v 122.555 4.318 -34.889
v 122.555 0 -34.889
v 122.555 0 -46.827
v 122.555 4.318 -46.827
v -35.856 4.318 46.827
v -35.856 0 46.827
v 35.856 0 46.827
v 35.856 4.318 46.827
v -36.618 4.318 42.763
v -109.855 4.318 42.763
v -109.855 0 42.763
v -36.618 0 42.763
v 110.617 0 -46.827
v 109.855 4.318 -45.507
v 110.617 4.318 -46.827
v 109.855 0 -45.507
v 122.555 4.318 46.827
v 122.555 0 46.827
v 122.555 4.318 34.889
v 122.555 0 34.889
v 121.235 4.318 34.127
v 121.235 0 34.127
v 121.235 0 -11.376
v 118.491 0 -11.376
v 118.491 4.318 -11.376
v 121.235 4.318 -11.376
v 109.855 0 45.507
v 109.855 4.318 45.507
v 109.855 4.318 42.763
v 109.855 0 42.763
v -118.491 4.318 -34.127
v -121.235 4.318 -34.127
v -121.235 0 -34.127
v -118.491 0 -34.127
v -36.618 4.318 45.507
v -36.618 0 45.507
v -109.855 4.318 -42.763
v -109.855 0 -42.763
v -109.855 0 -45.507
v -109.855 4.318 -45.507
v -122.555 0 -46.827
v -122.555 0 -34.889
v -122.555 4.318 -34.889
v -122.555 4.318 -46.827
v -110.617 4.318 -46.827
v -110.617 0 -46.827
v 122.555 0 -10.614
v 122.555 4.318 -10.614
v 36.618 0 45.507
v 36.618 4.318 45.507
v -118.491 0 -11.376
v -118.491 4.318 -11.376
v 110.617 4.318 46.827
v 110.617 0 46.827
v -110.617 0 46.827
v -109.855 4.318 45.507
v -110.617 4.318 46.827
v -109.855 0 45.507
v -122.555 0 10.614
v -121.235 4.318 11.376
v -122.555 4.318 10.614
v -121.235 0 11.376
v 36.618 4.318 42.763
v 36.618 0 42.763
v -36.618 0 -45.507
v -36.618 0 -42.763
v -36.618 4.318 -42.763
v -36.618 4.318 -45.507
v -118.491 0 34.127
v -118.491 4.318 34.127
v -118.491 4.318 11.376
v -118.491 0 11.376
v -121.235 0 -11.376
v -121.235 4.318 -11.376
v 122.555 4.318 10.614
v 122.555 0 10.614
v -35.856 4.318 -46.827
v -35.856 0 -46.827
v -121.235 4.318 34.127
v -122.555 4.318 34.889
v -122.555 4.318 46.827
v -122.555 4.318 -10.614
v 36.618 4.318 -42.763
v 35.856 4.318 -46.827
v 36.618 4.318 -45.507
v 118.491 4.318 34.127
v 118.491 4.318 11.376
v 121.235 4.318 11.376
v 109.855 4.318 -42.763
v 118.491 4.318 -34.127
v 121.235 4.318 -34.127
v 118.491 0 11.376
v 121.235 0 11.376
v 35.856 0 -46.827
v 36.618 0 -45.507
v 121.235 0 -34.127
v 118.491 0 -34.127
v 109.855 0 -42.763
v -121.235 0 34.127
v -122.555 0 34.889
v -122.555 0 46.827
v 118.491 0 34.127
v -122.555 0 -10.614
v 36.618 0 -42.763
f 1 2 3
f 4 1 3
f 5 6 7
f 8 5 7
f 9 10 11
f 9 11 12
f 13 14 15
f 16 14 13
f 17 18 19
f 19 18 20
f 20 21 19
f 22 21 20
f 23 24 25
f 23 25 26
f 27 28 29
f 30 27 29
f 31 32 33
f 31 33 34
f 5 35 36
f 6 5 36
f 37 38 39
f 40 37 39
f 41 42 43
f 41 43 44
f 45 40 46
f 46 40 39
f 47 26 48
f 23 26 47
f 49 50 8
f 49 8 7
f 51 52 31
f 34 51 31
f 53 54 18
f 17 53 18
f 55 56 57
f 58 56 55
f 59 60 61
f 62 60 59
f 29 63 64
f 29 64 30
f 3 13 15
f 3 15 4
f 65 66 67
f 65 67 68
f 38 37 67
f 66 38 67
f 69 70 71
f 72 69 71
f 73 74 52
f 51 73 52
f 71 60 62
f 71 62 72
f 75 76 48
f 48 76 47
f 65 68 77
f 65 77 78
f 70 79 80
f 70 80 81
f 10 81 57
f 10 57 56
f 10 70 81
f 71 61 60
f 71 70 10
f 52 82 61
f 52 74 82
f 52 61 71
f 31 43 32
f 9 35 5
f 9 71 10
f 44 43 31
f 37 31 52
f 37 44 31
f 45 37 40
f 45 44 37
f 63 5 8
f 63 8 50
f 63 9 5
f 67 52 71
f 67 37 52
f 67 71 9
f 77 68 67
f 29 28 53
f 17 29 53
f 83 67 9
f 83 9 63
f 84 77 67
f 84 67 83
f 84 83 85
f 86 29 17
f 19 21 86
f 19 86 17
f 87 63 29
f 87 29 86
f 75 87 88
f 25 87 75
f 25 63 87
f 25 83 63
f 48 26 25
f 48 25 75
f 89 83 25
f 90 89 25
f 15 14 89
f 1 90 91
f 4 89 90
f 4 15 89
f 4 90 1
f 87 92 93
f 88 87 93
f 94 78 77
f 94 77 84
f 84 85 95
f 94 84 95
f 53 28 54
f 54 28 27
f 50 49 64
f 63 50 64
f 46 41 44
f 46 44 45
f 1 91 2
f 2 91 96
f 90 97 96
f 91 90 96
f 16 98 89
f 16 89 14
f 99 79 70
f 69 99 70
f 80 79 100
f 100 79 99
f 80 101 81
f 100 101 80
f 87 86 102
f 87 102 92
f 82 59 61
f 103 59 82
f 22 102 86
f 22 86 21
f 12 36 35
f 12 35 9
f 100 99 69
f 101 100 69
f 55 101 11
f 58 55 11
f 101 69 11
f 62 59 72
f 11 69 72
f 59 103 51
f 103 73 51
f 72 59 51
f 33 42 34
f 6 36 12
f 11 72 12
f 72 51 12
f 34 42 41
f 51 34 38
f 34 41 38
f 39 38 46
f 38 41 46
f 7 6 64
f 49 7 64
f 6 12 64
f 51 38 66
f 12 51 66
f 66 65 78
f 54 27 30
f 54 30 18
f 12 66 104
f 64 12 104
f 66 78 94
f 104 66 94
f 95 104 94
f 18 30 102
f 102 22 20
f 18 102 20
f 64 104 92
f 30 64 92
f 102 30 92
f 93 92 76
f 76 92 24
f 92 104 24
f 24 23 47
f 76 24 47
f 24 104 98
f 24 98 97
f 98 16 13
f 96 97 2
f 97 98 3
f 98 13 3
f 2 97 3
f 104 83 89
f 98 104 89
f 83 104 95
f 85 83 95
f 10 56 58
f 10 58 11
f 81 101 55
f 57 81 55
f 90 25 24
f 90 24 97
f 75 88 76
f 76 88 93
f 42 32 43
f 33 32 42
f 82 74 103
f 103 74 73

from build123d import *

# Parameters (mm, degrees)
SKETCH1_W             = 245.11
SKETCH1_H             = 93.653112922
BOSS_EXTRUDE1_DEPTH   = 4.318
CUT_EXTRUDE1_REACH    = 6.318
SKETCH2_W             = 4.064
SKETCH2_H             = 22.751037641
SKETCH2_W_2           = 73.236666667
SKETCH2_H_2           = 4.064
CHAMFER1_SIZE         = 0.762
CHAMFER1_SIZE2        = 1.319822715
CHAMFER1_PART_2_SIZE  = 0.762
CHAMFER1_PART_2_SIZE2 = 1.319822715
CHAMFER1_PART_3_SIZE  = 0.762
CHAMFER1_PART_3_SIZE2 = 1.319822715
CHAMFER1_PART_4_SIZE  = 0.762
CHAMFER1_PART_4_SIZE2 = 1.319822715
CHAMFER1_PART_5_SIZE  = 0.762
CHAMFER1_PART_5_SIZE2 = 1.319822715
CHAMFER1_PART_6_SIZE  = 0.762
CHAMFER1_PART_6_SIZE2 = 1.319822715
CHAMFER1_PART_7_SIZE  = 0.762
CHAMFER1_PART_7_SIZE2 = 1.319822715
CHAMFER1_PART_8_SIZE  = 0.762
CHAMFER1_PART_8_SIZE2 = 1.319822715
CHAMFER2_SIZE         = 0.762
CHAMFER2_SIZE2        = 1.319822715
CHAMFER2_PART_2_SIZE  = 0.762
CHAMFER2_PART_2_SIZE2 = 1.319822715
CHAMFER2_PART_3_SIZE  = 0.762
CHAMFER2_PART_3_SIZE2 = 1.319822715
CHAMFER2_PART_4_SIZE  = 0.762
CHAMFER2_PART_4_SIZE2 = 1.319822715
CHAMFER2_PART_5_SIZE  = 0.762
CHAMFER2_PART_5_SIZE2 = 1.319822715
CHAMFER2_PART_6_SIZE  = 0.762
CHAMFER2_PART_6_SIZE2 = 1.319822715
CHAMFER2_PART_7_SIZE  = 0.762
CHAMFER2_PART_7_SIZE2 = 1.319822715
CHAMFER2_PART_8_SIZE  = 0.762
CHAMFER2_PART_8_SIZE2 = 1.319822715


with BuildPart() as part:
    # Sketch1 → Boss-Extrude1 (new body)
    with BuildSketch(Plane(origin=(0, 0, 0), x_dir=(1, 0, 0), z_dir=(0, 1, 0))):
        Rectangle(SKETCH1_W, SKETCH1_H)
    extrude(amount=BOSS_EXTRUDE1_DEPTH)

    # Sketch2 → Cut-Extrude1 (cut, up to next)
    with BuildSketch(Plane(origin=(0, 4.318, 0), x_dir=(1, 0, 0), z_dir=(0, 1, 0)), mode=Mode.PRIVATE) as cut_extrude1_sk1:
        with Locations((-120.523, 22.751037641)):
            Rectangle(SKETCH2_W, SKETCH2_H)
    cut_extrude1_tool1 = extrude(cut_extrude1_sk1.sketch, amount=-CUT_EXTRUDE1_REACH, mode=Mode.PRIVATE) & part.part
    add(cut_extrude1_tool1.solids().sort_by_distance((-120.523, 4.318, -22.751038))[0], mode=Mode.SUBTRACT)
    # Sketch2 → Cut-Extrude1 (cut, up to next)
    with BuildSketch(Plane(origin=(0, 4.318, 0), x_dir=(1, 0, 0), z_dir=(0, 1, 0)), mode=Mode.PRIVATE) as cut_extrude1_sk2:
        with Locations((-73.236666666, -44.794556461)):
            Rectangle(SKETCH2_W_2, SKETCH2_H_2)
    cut_extrude1_tool2 = extrude(cut_extrude1_sk2.sketch, amount=-CUT_EXTRUDE1_REACH, mode=Mode.PRIVATE) & part.part
    add(cut_extrude1_tool2.solids().sort_by_distance((-73.236667, 4.318, 44.794556))[0], mode=Mode.SUBTRACT)
    # Sketch2 → Cut-Extrude1 (cut, up to next)
    with BuildSketch(Plane(origin=(0, 4.318, 0), x_dir=(1, 0, 0), z_dir=(0, 1, 0)), mode=Mode.PRIVATE) as cut_extrude1_sk3:
        with Locations((73.236666666, -44.794556461)):
            Rectangle(SKETCH2_W_2, SKETCH2_H_2)
    cut_extrude1_tool3 = extrude(cut_extrude1_sk3.sketch, amount=-CUT_EXTRUDE1_REACH, mode=Mode.PRIVATE) & part.part
    add(cut_extrude1_tool3.solids().sort_by_distance((73.236667, 4.318, 44.794556))[0], mode=Mode.SUBTRACT)
    # Sketch2 → Cut-Extrude1 (cut, up to next)
    with BuildSketch(Plane(origin=(0, 4.318, 0), x_dir=(1, 0, 0), z_dir=(0, 1, 0)), mode=Mode.PRIVATE) as cut_extrude1_sk4:
        with Locations((-120.523, -22.751037641)):
            Rectangle(SKETCH2_W, SKETCH2_H)
    cut_extrude1_tool4 = extrude(cut_extrude1_sk4.sketch, amount=-CUT_EXTRUDE1_REACH, mode=Mode.PRIVATE) & part.part
    add(cut_extrude1_tool4.solids().sort_by_distance((-120.523, 4.318, 22.751038))[0], mode=Mode.SUBTRACT)
    # Sketch2 → Cut-Extrude1 (cut, up to next)
    with BuildSketch(Plane(origin=(0, 4.318, 0), x_dir=(1, 0, 0), z_dir=(0, 1, 0)), mode=Mode.PRIVATE) as cut_extrude1_sk5:
        with Locations((-73.236666666, 44.794556461)):
            Rectangle(SKETCH2_W_2, SKETCH2_H_2)
    cut_extrude1_tool5 = extrude(cut_extrude1_sk5.sketch, amount=-CUT_EXTRUDE1_REACH, mode=Mode.PRIVATE) & part.part
    add(cut_extrude1_tool5.solids().sort_by_distance((-73.236667, 4.318, -44.794556))[0], mode=Mode.SUBTRACT)
    # Sketch2 → Cut-Extrude1 (cut, up to next)
    with BuildSketch(Plane(origin=(0, 4.318, 0), x_dir=(1, 0, 0), z_dir=(0, 1, 0)), mode=Mode.PRIVATE) as cut_extrude1_sk6:
        with Locations((73.236666666, 44.794556461)):
            Rectangle(SKETCH2_W_2, SKETCH2_H_2)
    cut_extrude1_tool6 = extrude(cut_extrude1_sk6.sketch, amount=-CUT_EXTRUDE1_REACH, mode=Mode.PRIVATE) & part.part
    add(cut_extrude1_tool6.solids().sort_by_distance((73.236667, 4.318, -44.794556))[0], mode=Mode.SUBTRACT)
    # Sketch2 → Cut-Extrude1 (cut, up to next)
    with BuildSketch(Plane(origin=(0, 4.318, 0), x_dir=(1, 0, 0), z_dir=(0, 1, 0)), mode=Mode.PRIVATE) as cut_extrude1_sk7:
        with Locations((120.523, 22.751037641)):
            Rectangle(SKETCH2_W, SKETCH2_H)
    cut_extrude1_tool7 = extrude(cut_extrude1_sk7.sketch, amount=-CUT_EXTRUDE1_REACH, mode=Mode.PRIVATE) & part.part
    add(cut_extrude1_tool7.solids().sort_by_distance((120.523, 4.318, -22.751038))[0], mode=Mode.SUBTRACT)
    # Sketch2 → Cut-Extrude1 (cut, up to next)
    with BuildSketch(Plane(origin=(0, 4.318, 0), x_dir=(1, 0, 0), z_dir=(0, 1, 0)), mode=Mode.PRIVATE) as cut_extrude1_sk8:
        with Locations((120.523, -22.751037641)):
            Rectangle(SKETCH2_W, SKETCH2_H)
    cut_extrude1_tool8 = extrude(cut_extrude1_sk8.sketch, amount=-CUT_EXTRUDE1_REACH, mode=Mode.PRIVATE) & part.part
    add(cut_extrude1_tool8.solids().sort_by_distance((120.523, 4.318, 22.751038))[0], mode=Mode.SUBTRACT)

    # Chamfer1
    chamfer1_edges = [part.edges().sort_by_distance(p)[0] for p in [
        (109.855, 2.159, -46.826556461),
    ]]
    chamfer1_side = [part.faces().sort_by_distance(p)[0] for p in [
        (116.205, 2.159, -46.826556461),
    ]]
    chamfer(chamfer1_edges, length=CHAMFER1_SIZE, length2=CHAMFER1_SIZE2, reference=chamfer1_side[0])

    # Chamfer1 part 2
    chamfer1_part_2_edges = [part.edges().sort_by_distance(p)[0] for p in [
        (-109.855, 2.159, 46.826556461),
    ]]
    chamfer1_part_2_side = [part.faces().sort_by_distance(p)[0] for p in [
        (-116.205, 2.159, 46.826556461),
    ]]
    chamfer(chamfer1_part_2_edges, length=CHAMFER1_PART_2_SIZE, length2=CHAMFER1_PART_2_SIZE2, reference=chamfer1_part_2_side[0])

    # Chamfer1 part 3
    chamfer1_part_3_edges = [part.edges().sort_by_distance(p)[0] for p in [
        (-36.618333333, 2.159, -46.826556461),
    ]]
    chamfer1_part_3_side = [part.faces().sort_by_distance(p)[0] for p in [
        (0, 2.159, -46.826556461),
    ]]
    chamfer(chamfer1_part_3_edges, length=CHAMFER1_PART_3_SIZE, length2=CHAMFER1_PART_3_SIZE2, reference=chamfer1_part_3_side[0])

    # Chamfer1 part 4
    chamfer1_part_4_edges = [part.edges().sort_by_distance(p)[0] for p in [
        (-122.555, 2.159, 11.37551882),
    ]]
    chamfer1_part_4_side = [part.faces().sort_by_distance(p)[0] for p in [
        (-122.555, 2.159, 0),
    ]]
    chamfer(chamfer1_part_4_edges, length=CHAMFER1_PART_4_SIZE, length2=CHAMFER1_PART_4_SIZE2, reference=chamfer1_part_4_side[0])

    # Chamfer1 part 5
    chamfer1_part_5_edges = [part.edges().sort_by_distance(p)[0] for p in [
        (122.555, 2.159, 34.126556461),
    ]]
    chamfer1_part_5_side = [part.faces().sort_by_distance(p)[0] for p in [
        (122.555, 2.159, 40.476556461),
    ]]
    chamfer(chamfer1_part_5_edges, length=CHAMFER1_PART_5_SIZE, length2=CHAMFER1_PART_5_SIZE2, reference=chamfer1_part_5_side[0])

    # Chamfer1 part 6
    chamfer1_part_6_edges = [part.edges().sort_by_distance(p)[0] for p in [
        (122.555, 2.159, -11.37551882),
    ]]
    chamfer1_part_6_side = [part.faces().sort_by_distance(p)[0] for p in [
        (122.555, 2.159, 0),
    ]]
    chamfer(chamfer1_part_6_edges, length=CHAMFER1_PART_6_SIZE, length2=CHAMFER1_PART_6_SIZE2, reference=chamfer1_part_6_side[0])

    # Chamfer1 part 7
    chamfer1_part_7_edges = [part.edges().sort_by_distance(p)[0] for p in [
        (36.618333333, 2.159, 46.826556461),
    ]]
    chamfer1_part_7_side = [part.faces().sort_by_distance(p)[0] for p in [
        (0, 2.159, 46.826556461),
    ]]
    chamfer(chamfer1_part_7_edges, length=CHAMFER1_PART_7_SIZE, length2=CHAMFER1_PART_7_SIZE2, reference=chamfer1_part_7_side[0])

    # Chamfer1 part 8
    chamfer1_part_8_edges = [part.edges().sort_by_distance(p)[0] for p in [
        (-122.555, 2.159, -34.126556461),
    ]]
    chamfer1_part_8_side = [part.faces().sort_by_distance(p)[0] for p in [
        (-122.555, 2.159, -40.476556461),
    ]]
    chamfer(chamfer1_part_8_edges, length=CHAMFER1_PART_8_SIZE, length2=CHAMFER1_PART_8_SIZE2, reference=chamfer1_part_8_side[0])

    # Chamfer2
    chamfer2_edges = [part.edges().sort_by_distance(p)[0] for p in [
        (36.618333333, 2.159, -46.826556461),
    ]]
    chamfer2_side = [part.faces().sort_by_distance(p)[0] for p in [
        (0.381, 2.159, -46.826556461),
    ]]
    chamfer(chamfer2_edges, length=CHAMFER2_SIZE, length2=CHAMFER2_SIZE2, reference=chamfer2_side[0])

    # Chamfer2 part 2
    chamfer2_part_2_edges = [part.edges().sort_by_distance(p)[0] for p in [
        (-36.618333333, 2.159, 46.826556461),
    ]]
    chamfer2_part_2_side = [part.faces().sort_by_distance(p)[0] for p in [
        (-0.381, 2.159, 46.826556461),
    ]]
    chamfer(chamfer2_part_2_edges, length=CHAMFER2_PART_2_SIZE, length2=CHAMFER2_PART_2_SIZE2, reference=chamfer2_part_2_side[0])

    # Chamfer2 part 3
    chamfer2_part_3_edges = [part.edges().sort_by_distance(p)[0] for p in [
        (-109.855, 2.159, -46.826556461),
    ]]
    chamfer2_part_3_side = [part.faces().sort_by_distance(p)[0] for p in [
        (-116.205, 2.159, -46.826556461),
    ]]
    chamfer(chamfer2_part_3_edges, length=CHAMFER2_PART_3_SIZE, length2=CHAMFER2_PART_3_SIZE2, reference=chamfer2_part_3_side[0])

    # Chamfer2 part 4
    chamfer2_part_4_edges = [part.edges().sort_by_distance(p)[0] for p in [
        (-122.555, 2.159, 34.126556461),
    ]]
    chamfer2_part_4_side = [part.faces().sort_by_distance(p)[0] for p in [
        (-122.555, 2.159, 40.476556461),
    ]]
    chamfer(chamfer2_part_4_edges, length=CHAMFER2_PART_4_SIZE, length2=CHAMFER2_PART_4_SIZE2, reference=chamfer2_part_4_side[0])

    # Chamfer2 part 5
    chamfer2_part_5_edges = [part.edges().sort_by_distance(p)[0] for p in [
        (122.555, 2.159, 11.37551882),
    ]]
    chamfer2_part_5_side = [part.faces().sort_by_distance(p)[0] for p in [
        (122.555, 2.159, 0.381),
    ]]
    chamfer(chamfer2_part_5_edges, length=CHAMFER2_PART_5_SIZE, length2=CHAMFER2_PART_5_SIZE2, reference=chamfer2_part_5_side[0])

    # Chamfer2 part 6
    chamfer2_part_6_edges = [part.edges().sort_by_distance(p)[0] for p in [
        (122.555, 2.159, -34.126556461),
    ]]
    chamfer2_part_6_side = [part.faces().sort_by_distance(p)[0] for p in [
        (122.555, 2.159, -40.476556461),
    ]]
    chamfer(chamfer2_part_6_edges, length=CHAMFER2_PART_6_SIZE, length2=CHAMFER2_PART_6_SIZE2, reference=chamfer2_part_6_side[0])

    # Chamfer2 part 7
    chamfer2_part_7_edges = [part.edges().sort_by_distance(p)[0] for p in [
        (109.855, 2.159, 46.826556461),
    ]]
    chamfer2_part_7_side = [part.faces().sort_by_distance(p)[0] for p in [
        (116.205, 2.159, 46.826556461),
    ]]
    chamfer(chamfer2_part_7_edges, length=CHAMFER2_PART_7_SIZE, length2=CHAMFER2_PART_7_SIZE2, reference=chamfer2_part_7_side[0])

    # Chamfer2 part 8
    chamfer2_part_8_edges = [part.edges().sort_by_distance(p)[0] for p in [
        (-122.555, 2.159, -11.37551882),
    ]]
    chamfer2_part_8_side = [part.faces().sort_by_distance(p)[0] for p in [
        (-122.555, 2.159, -0.381),
    ]]
    chamfer(chamfer2_part_8_edges, length=CHAMFER2_PART_8_SIZE, length2=CHAMFER2_PART_8_SIZE2, reference=chamfer2_part_8_side[0])


solid = part.part
